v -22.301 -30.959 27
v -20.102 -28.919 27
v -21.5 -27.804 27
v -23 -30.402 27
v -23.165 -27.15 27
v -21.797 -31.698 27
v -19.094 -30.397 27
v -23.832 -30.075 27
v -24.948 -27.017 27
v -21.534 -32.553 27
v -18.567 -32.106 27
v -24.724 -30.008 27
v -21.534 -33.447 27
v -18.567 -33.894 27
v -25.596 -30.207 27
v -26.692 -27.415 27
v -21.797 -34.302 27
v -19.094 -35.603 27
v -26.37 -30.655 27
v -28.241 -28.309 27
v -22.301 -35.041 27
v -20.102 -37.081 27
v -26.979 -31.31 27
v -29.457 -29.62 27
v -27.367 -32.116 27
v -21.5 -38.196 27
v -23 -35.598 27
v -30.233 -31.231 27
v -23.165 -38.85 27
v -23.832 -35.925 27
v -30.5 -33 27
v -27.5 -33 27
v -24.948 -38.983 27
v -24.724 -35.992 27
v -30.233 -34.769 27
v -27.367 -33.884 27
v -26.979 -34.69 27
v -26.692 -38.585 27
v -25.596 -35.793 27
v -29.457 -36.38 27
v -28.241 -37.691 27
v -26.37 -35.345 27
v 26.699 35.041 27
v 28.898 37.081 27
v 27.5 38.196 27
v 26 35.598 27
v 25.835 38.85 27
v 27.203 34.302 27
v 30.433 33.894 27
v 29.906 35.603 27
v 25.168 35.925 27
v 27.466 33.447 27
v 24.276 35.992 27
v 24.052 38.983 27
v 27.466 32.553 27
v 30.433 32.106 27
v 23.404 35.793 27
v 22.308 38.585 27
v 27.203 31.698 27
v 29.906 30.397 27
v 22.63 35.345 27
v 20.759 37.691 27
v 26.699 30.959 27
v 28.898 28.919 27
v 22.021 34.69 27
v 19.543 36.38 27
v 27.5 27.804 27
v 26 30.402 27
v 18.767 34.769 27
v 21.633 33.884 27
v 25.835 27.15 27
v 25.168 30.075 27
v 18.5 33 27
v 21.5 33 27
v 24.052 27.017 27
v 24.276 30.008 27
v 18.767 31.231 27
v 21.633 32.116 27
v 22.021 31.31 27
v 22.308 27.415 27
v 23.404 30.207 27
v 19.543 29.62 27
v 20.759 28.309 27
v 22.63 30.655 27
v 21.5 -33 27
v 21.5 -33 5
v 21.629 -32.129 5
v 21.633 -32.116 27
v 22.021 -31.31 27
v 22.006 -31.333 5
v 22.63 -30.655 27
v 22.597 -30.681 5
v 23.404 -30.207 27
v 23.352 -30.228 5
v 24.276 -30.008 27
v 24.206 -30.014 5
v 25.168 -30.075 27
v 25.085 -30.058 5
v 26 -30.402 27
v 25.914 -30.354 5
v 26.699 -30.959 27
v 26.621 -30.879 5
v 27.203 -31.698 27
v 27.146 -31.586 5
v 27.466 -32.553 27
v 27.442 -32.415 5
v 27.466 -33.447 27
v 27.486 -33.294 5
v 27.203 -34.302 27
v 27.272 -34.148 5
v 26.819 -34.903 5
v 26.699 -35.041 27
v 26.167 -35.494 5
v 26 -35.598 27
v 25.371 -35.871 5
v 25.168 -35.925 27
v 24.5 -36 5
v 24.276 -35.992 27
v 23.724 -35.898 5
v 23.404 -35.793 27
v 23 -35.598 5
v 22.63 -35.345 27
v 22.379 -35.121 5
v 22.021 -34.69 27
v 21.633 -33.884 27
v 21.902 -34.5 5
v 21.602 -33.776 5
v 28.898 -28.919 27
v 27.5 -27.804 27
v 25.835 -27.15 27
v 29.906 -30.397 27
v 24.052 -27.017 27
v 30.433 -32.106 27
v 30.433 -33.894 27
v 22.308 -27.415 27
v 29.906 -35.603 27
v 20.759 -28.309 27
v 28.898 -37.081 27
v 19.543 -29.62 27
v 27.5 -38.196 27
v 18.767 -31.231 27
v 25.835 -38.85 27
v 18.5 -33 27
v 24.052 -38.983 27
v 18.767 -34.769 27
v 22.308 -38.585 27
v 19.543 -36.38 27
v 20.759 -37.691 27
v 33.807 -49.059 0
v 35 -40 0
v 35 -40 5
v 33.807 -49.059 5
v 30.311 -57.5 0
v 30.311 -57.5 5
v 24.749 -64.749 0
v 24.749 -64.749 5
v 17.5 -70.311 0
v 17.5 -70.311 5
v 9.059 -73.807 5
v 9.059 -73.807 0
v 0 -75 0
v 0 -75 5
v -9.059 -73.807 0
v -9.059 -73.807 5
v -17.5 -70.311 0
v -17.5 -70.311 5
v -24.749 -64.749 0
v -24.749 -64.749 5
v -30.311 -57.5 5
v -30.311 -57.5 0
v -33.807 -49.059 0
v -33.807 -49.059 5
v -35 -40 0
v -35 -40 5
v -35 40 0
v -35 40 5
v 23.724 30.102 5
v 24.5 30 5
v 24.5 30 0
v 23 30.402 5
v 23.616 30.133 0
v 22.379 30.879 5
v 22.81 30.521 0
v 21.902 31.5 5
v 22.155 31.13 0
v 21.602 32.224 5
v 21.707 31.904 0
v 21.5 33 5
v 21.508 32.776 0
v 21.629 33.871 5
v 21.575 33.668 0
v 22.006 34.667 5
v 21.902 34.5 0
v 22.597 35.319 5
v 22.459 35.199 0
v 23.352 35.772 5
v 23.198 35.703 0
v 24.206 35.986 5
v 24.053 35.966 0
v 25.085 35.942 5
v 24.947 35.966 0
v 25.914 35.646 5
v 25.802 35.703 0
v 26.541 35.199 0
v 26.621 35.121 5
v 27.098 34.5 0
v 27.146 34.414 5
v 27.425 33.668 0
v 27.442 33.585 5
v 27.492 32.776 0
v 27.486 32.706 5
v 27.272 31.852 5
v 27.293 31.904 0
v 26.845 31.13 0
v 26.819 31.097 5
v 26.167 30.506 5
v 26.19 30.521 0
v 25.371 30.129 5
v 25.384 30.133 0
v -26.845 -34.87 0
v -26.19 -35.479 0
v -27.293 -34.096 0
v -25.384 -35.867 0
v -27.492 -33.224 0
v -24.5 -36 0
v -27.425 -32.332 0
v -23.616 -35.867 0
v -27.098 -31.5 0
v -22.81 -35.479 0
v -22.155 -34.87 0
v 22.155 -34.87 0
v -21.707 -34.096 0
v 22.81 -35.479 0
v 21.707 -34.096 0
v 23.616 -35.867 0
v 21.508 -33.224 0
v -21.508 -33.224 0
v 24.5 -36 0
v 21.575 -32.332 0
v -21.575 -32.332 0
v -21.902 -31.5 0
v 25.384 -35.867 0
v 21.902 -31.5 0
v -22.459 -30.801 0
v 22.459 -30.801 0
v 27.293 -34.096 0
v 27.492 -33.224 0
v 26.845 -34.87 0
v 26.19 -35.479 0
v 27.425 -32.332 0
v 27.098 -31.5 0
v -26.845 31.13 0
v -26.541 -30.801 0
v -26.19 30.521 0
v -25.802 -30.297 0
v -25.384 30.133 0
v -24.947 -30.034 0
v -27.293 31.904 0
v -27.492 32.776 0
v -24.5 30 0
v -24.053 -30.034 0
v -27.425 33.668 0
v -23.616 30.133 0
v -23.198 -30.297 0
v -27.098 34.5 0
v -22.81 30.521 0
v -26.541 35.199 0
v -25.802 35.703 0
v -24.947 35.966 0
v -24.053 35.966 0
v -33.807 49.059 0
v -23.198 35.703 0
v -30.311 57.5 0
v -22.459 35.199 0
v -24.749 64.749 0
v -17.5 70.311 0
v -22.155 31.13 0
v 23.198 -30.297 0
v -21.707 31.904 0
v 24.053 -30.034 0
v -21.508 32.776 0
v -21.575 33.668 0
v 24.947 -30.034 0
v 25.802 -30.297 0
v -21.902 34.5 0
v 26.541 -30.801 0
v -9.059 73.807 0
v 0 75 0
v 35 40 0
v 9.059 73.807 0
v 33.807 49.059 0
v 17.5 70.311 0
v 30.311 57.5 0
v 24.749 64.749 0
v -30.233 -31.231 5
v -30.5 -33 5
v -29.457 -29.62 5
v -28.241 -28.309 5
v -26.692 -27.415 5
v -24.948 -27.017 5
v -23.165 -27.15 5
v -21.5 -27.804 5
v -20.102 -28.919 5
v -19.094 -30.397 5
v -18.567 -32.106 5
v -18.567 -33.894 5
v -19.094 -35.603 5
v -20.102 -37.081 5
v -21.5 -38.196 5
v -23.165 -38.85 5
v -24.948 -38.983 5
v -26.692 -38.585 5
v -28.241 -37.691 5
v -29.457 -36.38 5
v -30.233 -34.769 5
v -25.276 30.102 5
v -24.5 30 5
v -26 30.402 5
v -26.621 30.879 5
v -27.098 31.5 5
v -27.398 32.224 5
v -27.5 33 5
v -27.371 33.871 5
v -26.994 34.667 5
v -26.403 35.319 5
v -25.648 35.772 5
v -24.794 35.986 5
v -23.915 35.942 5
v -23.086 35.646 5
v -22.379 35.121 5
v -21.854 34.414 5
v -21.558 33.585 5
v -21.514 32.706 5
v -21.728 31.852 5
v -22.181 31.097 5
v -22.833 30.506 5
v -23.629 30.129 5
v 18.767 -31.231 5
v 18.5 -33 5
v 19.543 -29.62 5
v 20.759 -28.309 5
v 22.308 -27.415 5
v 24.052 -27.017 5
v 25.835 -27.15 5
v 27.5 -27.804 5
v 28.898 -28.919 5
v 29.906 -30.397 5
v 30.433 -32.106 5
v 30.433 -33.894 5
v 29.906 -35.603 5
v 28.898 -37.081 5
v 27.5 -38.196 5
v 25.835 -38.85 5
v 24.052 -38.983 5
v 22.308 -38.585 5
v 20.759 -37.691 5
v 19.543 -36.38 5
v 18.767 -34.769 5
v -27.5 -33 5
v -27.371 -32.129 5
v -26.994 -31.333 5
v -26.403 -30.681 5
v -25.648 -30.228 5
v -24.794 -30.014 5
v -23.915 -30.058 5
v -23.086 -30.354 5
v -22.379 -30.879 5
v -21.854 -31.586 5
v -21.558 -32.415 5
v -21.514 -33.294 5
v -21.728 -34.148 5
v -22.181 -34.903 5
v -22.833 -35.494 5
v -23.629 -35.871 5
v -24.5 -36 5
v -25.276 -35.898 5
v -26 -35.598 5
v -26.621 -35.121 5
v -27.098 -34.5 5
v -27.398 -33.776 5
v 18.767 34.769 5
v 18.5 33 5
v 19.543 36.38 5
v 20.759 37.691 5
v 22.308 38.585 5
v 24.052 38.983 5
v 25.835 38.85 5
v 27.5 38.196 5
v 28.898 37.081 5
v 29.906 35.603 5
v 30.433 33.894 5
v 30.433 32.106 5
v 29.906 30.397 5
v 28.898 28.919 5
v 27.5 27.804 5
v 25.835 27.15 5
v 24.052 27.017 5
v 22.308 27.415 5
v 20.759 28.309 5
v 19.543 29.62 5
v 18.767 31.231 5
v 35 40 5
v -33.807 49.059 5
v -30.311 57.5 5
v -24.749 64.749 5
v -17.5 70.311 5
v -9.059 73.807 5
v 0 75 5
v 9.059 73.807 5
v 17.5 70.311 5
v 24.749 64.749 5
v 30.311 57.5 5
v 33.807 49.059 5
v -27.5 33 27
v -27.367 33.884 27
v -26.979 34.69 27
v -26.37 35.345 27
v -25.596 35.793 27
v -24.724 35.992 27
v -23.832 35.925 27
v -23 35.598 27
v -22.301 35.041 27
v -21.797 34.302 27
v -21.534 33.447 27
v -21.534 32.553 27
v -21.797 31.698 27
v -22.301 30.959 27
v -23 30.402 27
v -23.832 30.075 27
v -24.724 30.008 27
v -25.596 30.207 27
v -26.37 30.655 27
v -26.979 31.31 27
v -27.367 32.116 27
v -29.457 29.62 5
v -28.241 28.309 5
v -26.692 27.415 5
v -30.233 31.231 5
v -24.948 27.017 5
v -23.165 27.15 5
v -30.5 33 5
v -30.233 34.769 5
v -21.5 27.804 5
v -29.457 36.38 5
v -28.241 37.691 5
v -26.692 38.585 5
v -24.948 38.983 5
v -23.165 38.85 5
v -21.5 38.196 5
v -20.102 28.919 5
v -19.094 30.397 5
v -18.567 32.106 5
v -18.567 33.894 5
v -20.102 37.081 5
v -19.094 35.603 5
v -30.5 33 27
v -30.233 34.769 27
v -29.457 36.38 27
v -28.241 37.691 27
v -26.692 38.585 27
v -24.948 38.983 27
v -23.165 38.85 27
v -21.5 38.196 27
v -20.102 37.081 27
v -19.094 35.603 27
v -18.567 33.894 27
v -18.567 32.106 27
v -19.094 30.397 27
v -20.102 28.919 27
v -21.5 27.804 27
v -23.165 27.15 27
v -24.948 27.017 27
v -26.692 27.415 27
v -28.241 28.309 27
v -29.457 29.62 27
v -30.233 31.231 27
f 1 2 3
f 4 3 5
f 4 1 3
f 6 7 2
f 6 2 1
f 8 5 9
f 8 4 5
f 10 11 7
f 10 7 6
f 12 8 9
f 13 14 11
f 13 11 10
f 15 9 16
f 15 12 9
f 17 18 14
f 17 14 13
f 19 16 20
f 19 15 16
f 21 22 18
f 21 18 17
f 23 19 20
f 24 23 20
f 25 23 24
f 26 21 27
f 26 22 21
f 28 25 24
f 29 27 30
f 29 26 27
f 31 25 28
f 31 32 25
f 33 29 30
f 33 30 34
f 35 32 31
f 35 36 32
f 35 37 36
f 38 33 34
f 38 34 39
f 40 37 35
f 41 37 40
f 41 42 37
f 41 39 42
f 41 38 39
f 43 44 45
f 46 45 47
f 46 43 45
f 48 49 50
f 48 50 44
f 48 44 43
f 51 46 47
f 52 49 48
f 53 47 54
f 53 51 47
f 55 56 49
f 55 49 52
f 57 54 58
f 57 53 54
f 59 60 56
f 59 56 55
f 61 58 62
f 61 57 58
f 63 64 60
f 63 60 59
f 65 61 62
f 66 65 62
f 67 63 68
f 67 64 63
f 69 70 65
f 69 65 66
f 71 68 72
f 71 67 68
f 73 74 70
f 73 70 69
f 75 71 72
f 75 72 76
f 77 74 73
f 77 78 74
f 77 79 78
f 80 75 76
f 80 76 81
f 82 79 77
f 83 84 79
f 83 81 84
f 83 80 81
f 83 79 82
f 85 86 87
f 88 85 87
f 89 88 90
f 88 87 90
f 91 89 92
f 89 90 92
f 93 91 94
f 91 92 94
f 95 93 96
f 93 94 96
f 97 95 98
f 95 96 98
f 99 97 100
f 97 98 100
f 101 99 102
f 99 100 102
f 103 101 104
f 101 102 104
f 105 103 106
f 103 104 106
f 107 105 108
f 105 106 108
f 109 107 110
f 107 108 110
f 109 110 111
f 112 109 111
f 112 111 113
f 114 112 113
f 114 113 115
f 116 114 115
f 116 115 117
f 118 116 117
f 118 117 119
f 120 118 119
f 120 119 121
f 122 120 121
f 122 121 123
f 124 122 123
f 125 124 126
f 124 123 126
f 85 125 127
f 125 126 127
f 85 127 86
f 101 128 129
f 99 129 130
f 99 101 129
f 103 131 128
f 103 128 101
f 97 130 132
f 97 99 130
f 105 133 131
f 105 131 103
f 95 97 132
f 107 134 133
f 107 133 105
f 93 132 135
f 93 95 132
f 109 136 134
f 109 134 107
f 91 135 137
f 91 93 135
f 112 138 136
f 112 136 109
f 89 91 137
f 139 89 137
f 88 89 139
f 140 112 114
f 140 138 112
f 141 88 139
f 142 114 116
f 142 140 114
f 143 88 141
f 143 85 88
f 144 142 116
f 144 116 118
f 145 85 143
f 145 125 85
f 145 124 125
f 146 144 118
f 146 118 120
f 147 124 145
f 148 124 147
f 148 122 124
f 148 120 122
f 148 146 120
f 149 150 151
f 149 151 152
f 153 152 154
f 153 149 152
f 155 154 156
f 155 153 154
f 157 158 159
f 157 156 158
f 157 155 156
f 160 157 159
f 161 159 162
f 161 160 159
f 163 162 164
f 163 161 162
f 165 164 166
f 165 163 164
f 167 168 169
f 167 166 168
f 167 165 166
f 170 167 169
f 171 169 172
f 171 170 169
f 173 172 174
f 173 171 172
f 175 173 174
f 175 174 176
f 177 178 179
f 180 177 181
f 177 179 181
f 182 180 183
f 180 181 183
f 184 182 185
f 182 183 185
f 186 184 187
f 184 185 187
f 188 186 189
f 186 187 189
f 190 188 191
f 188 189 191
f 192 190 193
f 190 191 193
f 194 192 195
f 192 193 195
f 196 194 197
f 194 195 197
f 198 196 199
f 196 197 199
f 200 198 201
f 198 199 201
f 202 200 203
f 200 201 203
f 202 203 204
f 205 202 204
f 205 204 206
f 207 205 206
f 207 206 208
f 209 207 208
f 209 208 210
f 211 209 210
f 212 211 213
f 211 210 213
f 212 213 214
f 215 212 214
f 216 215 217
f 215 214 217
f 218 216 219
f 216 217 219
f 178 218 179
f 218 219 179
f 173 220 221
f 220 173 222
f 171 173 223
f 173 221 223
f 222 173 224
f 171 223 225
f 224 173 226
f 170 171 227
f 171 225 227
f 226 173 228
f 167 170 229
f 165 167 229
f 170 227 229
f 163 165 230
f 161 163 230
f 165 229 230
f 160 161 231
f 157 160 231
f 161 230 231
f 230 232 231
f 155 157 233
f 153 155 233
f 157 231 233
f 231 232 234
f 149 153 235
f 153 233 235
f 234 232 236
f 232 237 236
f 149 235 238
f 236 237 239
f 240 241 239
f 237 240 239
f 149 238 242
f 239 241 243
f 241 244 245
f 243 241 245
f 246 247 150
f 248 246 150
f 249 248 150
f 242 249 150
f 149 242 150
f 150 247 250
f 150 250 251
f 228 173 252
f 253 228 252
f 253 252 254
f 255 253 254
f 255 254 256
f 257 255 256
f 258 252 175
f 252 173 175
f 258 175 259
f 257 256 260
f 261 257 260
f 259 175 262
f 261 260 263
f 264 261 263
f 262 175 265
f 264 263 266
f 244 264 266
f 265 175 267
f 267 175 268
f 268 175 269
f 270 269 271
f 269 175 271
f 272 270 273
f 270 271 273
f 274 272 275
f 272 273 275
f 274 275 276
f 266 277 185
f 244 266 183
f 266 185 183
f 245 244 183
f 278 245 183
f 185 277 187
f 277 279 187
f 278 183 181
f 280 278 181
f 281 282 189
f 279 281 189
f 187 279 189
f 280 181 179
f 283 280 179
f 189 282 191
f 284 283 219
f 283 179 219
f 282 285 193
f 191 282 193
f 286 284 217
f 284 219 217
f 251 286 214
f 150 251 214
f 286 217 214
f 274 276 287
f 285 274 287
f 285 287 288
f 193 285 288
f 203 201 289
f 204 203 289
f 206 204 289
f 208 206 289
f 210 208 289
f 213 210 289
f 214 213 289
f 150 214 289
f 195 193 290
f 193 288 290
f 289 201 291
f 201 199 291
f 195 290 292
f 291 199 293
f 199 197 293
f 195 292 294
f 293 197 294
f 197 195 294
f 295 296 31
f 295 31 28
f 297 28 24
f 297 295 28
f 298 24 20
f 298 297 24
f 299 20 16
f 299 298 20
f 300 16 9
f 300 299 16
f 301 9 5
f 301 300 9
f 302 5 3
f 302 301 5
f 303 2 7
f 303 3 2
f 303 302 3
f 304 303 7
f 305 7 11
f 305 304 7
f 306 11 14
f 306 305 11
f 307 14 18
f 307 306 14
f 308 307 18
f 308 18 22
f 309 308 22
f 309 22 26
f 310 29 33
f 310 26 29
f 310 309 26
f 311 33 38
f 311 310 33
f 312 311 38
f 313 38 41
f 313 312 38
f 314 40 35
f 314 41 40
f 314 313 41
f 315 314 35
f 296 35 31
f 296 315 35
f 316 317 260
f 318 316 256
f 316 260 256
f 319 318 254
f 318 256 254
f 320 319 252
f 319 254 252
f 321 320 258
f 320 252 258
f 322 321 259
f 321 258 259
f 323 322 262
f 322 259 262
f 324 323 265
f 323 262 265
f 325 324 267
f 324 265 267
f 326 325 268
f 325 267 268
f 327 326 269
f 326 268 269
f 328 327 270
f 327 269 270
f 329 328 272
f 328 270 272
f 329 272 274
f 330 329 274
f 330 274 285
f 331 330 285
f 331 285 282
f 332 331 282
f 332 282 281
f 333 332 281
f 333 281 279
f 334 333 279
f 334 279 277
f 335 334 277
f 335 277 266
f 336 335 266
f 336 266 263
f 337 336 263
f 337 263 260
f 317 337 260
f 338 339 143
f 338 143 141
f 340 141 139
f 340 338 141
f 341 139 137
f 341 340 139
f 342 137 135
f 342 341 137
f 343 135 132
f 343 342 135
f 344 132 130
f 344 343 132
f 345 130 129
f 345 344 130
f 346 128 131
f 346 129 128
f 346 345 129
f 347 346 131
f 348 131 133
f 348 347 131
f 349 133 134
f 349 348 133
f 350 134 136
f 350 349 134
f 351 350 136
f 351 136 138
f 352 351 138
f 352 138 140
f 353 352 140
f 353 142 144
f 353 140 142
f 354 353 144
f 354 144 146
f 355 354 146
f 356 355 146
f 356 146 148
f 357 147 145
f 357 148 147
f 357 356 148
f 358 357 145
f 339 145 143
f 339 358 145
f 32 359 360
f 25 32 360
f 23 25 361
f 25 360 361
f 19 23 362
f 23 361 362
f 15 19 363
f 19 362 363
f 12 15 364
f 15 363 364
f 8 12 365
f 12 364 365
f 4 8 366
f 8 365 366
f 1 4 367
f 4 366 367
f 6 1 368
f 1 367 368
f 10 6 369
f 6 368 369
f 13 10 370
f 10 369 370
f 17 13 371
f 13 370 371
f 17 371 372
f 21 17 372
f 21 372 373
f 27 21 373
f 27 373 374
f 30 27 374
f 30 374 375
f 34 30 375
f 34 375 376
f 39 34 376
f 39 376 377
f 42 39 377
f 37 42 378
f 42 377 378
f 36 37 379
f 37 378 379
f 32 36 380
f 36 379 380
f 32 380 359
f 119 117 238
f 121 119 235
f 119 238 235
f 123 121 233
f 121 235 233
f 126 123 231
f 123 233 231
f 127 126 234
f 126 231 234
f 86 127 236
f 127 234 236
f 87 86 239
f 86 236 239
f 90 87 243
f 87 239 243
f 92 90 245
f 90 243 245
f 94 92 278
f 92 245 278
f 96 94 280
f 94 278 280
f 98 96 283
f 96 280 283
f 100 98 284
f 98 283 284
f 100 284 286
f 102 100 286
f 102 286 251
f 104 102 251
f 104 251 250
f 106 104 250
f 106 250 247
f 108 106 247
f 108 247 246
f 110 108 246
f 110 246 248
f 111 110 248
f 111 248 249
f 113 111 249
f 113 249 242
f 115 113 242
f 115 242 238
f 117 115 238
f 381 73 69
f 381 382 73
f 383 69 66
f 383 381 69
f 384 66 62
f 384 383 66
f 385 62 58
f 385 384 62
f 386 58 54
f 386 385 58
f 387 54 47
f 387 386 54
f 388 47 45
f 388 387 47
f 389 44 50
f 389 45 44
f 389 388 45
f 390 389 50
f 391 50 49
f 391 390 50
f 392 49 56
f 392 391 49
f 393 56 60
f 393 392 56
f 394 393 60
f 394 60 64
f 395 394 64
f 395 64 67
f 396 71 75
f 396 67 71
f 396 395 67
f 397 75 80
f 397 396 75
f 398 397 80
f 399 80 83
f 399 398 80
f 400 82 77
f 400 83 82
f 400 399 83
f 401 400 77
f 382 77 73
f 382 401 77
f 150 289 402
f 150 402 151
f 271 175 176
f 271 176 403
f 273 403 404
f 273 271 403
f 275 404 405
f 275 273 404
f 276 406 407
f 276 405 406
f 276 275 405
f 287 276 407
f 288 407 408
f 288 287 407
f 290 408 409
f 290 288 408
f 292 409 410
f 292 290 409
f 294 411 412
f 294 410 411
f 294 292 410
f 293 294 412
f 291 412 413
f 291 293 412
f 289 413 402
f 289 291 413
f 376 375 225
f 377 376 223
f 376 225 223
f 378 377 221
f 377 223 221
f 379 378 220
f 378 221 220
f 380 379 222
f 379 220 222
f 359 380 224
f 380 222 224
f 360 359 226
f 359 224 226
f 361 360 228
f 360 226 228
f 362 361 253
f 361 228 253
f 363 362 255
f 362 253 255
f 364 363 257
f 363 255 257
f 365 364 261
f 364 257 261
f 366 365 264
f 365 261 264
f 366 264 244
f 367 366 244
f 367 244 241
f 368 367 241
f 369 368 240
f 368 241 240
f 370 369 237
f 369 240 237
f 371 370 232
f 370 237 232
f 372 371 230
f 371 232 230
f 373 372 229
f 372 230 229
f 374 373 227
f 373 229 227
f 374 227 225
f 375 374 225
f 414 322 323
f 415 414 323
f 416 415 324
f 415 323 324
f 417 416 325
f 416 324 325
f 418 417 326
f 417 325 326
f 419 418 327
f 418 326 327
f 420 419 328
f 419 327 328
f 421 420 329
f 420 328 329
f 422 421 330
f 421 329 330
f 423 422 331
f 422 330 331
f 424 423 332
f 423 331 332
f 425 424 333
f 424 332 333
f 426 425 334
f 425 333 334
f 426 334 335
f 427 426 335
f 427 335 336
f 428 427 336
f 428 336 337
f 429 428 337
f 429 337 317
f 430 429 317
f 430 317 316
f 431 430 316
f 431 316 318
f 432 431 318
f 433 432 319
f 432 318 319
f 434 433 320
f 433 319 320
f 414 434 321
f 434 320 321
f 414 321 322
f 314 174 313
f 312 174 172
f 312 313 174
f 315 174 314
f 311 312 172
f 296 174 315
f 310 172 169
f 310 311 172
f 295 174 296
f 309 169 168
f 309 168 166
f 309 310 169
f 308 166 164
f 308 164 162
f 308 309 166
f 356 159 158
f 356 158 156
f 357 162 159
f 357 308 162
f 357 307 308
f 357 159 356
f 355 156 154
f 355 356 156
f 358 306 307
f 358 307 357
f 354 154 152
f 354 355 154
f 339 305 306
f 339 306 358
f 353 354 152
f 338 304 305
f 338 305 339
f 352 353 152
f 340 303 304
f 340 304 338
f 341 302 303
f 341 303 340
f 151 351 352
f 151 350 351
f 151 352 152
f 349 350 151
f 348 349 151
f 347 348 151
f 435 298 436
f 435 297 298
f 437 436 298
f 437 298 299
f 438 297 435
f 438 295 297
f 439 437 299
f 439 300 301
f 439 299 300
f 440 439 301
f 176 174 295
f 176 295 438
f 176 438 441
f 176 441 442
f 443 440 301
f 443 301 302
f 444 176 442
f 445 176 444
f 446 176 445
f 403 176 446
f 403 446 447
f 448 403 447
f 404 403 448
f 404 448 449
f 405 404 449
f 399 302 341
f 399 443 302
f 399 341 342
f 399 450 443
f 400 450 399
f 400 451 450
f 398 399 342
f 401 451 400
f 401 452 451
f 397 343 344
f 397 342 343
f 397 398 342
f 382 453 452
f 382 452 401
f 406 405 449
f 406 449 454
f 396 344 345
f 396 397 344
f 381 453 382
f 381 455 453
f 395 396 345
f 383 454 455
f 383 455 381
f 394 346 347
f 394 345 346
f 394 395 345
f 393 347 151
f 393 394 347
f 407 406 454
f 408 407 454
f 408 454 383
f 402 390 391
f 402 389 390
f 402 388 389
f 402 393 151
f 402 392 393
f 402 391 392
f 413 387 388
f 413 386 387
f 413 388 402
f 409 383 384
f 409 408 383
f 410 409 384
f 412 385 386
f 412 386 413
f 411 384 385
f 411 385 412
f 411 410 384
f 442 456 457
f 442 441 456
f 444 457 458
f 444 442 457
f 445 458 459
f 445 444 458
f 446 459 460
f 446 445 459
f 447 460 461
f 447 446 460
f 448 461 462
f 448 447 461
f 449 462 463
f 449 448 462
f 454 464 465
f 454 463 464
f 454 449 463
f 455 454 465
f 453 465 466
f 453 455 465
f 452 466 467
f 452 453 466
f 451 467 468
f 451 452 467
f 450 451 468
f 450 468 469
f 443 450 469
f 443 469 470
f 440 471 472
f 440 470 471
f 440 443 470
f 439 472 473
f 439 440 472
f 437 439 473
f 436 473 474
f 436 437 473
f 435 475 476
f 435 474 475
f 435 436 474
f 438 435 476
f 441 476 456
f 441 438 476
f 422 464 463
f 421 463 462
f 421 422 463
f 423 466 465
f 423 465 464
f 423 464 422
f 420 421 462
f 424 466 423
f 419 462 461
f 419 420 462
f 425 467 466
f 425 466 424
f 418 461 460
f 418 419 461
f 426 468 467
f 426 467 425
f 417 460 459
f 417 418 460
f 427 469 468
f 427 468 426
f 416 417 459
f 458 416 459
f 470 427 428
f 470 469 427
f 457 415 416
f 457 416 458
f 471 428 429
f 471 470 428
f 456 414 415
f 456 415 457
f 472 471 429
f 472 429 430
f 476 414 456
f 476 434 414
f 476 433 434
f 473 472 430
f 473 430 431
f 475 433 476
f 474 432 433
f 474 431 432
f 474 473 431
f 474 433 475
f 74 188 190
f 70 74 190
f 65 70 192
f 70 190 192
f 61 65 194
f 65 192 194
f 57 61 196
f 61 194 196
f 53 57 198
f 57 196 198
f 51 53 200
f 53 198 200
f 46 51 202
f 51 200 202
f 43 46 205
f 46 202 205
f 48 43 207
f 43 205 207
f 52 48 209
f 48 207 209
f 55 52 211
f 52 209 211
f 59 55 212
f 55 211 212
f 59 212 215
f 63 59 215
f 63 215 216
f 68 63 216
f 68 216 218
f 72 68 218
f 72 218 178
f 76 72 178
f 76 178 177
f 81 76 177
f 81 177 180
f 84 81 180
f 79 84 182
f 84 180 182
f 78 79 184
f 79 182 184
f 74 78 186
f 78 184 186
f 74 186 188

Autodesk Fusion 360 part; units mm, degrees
sketch "Sketch1" plane through (0, 0, 0) normal (0, 0, 1) x (1, 0, 0)
  line L0 (35, 40) -> (35, -40)
  line L1 (-35, -40) -> (-35, 40)
  line L2 (0, 1.75) -> (0, 22.5)
  line L3 (1.75, 0) -> (22.5, 0)
  arc A0 (-35, -40) -> (35, -40) centre (0, -40) ccw
  arc A1 (35, 40) -> (-35, 40) centre (0, 40) ccw
  dimension "d2" = 80
  dimension "d3" = 70
extrude "Extrude1" add sketch "Sketch1" along normal blind 5
sketch "Sketch2" plane through (0, 0, 5) normal (0, 0, 1) x (-1, 0, 0)
  arc A0 (35, 40) -> (-35, 40) centre (0, 40) ccw
  line L0 (-35, 40) -> (-35, -40)
  arc A1 (-35, -40) -> (35, -40) centre (0, -40) ccw
  line L1 (35, -40) -> (35, 40)
  line L2 (24.5, -33) -> (-24.5, -33) construction
  line L3 (-24.5, -33) -> (-24.5, 33) construction
  line L4 (-24.5, 33) -> (24.5, 33) construction
  line L5 (24.5, 33) -> (24.5, -33) construction
  line L6 (-1.75, 0) -> (-22.5, 0)
  line L7 (0, -1.75) -> (0, -22.5)
  point P0 (24.5, -33)
  point P1 (-24.5, -33)
  point P2 (-24.5, 33)
  point P3 (24.5, 33)
  dimension "d6" = 49
  dimension "d7" = 66
hole "Hole1" at (-24.5, 33, 5) at (24.5, 33, 5) at (24.5, -33, 5) at (-24.5, -33, 5) direction (0, 0, -1) diameter 6 end through all
sketch "Sketch3" plane through (0, 0, 5) normal (0, 0, 1) x (-1, 0, 0)
  circle A0 centre (-24.5, 33) radius 3
  circle A1 centre (24.5, -33) radius 3
  circle A2 centre (-24.5, -33) radius 3
  circle A3 centre (24.5, 33) radius 3
  arc A4 (35, 40) -> (-35, 40) centre (0, 40) ccw
  line L0 (-35, 40) -> (-35, -40)
  arc A5 (-35, -40) -> (35, -40) centre (0, -40) ccw
  line L1 (35, -40) -> (35, 40)
  circle A6 centre (24.5, -33) radius 3
  circle A7 centre (-24.5, -33) radius 3
  circle A8 centre (-24.5, 33) radius 3
  circle A9 centre (24.5, 33) radius 3
  circle A10 centre (24.5, -33) radius 6
  circle A11 centre (-24.5, -33) radius 6
  circle A12 centre (24.5, 33) radius 6
  circle A13 centre (-24.5, 33) radius 6
  dimension "d10" = 3
  dimension "d11" = 3
  dimension "d12" = 3
  dimension "d13" = 3
extrude "Extrude2" add sketch "Sketch3" along normal blind 22 contours A10 | A11 | A12 | A13
